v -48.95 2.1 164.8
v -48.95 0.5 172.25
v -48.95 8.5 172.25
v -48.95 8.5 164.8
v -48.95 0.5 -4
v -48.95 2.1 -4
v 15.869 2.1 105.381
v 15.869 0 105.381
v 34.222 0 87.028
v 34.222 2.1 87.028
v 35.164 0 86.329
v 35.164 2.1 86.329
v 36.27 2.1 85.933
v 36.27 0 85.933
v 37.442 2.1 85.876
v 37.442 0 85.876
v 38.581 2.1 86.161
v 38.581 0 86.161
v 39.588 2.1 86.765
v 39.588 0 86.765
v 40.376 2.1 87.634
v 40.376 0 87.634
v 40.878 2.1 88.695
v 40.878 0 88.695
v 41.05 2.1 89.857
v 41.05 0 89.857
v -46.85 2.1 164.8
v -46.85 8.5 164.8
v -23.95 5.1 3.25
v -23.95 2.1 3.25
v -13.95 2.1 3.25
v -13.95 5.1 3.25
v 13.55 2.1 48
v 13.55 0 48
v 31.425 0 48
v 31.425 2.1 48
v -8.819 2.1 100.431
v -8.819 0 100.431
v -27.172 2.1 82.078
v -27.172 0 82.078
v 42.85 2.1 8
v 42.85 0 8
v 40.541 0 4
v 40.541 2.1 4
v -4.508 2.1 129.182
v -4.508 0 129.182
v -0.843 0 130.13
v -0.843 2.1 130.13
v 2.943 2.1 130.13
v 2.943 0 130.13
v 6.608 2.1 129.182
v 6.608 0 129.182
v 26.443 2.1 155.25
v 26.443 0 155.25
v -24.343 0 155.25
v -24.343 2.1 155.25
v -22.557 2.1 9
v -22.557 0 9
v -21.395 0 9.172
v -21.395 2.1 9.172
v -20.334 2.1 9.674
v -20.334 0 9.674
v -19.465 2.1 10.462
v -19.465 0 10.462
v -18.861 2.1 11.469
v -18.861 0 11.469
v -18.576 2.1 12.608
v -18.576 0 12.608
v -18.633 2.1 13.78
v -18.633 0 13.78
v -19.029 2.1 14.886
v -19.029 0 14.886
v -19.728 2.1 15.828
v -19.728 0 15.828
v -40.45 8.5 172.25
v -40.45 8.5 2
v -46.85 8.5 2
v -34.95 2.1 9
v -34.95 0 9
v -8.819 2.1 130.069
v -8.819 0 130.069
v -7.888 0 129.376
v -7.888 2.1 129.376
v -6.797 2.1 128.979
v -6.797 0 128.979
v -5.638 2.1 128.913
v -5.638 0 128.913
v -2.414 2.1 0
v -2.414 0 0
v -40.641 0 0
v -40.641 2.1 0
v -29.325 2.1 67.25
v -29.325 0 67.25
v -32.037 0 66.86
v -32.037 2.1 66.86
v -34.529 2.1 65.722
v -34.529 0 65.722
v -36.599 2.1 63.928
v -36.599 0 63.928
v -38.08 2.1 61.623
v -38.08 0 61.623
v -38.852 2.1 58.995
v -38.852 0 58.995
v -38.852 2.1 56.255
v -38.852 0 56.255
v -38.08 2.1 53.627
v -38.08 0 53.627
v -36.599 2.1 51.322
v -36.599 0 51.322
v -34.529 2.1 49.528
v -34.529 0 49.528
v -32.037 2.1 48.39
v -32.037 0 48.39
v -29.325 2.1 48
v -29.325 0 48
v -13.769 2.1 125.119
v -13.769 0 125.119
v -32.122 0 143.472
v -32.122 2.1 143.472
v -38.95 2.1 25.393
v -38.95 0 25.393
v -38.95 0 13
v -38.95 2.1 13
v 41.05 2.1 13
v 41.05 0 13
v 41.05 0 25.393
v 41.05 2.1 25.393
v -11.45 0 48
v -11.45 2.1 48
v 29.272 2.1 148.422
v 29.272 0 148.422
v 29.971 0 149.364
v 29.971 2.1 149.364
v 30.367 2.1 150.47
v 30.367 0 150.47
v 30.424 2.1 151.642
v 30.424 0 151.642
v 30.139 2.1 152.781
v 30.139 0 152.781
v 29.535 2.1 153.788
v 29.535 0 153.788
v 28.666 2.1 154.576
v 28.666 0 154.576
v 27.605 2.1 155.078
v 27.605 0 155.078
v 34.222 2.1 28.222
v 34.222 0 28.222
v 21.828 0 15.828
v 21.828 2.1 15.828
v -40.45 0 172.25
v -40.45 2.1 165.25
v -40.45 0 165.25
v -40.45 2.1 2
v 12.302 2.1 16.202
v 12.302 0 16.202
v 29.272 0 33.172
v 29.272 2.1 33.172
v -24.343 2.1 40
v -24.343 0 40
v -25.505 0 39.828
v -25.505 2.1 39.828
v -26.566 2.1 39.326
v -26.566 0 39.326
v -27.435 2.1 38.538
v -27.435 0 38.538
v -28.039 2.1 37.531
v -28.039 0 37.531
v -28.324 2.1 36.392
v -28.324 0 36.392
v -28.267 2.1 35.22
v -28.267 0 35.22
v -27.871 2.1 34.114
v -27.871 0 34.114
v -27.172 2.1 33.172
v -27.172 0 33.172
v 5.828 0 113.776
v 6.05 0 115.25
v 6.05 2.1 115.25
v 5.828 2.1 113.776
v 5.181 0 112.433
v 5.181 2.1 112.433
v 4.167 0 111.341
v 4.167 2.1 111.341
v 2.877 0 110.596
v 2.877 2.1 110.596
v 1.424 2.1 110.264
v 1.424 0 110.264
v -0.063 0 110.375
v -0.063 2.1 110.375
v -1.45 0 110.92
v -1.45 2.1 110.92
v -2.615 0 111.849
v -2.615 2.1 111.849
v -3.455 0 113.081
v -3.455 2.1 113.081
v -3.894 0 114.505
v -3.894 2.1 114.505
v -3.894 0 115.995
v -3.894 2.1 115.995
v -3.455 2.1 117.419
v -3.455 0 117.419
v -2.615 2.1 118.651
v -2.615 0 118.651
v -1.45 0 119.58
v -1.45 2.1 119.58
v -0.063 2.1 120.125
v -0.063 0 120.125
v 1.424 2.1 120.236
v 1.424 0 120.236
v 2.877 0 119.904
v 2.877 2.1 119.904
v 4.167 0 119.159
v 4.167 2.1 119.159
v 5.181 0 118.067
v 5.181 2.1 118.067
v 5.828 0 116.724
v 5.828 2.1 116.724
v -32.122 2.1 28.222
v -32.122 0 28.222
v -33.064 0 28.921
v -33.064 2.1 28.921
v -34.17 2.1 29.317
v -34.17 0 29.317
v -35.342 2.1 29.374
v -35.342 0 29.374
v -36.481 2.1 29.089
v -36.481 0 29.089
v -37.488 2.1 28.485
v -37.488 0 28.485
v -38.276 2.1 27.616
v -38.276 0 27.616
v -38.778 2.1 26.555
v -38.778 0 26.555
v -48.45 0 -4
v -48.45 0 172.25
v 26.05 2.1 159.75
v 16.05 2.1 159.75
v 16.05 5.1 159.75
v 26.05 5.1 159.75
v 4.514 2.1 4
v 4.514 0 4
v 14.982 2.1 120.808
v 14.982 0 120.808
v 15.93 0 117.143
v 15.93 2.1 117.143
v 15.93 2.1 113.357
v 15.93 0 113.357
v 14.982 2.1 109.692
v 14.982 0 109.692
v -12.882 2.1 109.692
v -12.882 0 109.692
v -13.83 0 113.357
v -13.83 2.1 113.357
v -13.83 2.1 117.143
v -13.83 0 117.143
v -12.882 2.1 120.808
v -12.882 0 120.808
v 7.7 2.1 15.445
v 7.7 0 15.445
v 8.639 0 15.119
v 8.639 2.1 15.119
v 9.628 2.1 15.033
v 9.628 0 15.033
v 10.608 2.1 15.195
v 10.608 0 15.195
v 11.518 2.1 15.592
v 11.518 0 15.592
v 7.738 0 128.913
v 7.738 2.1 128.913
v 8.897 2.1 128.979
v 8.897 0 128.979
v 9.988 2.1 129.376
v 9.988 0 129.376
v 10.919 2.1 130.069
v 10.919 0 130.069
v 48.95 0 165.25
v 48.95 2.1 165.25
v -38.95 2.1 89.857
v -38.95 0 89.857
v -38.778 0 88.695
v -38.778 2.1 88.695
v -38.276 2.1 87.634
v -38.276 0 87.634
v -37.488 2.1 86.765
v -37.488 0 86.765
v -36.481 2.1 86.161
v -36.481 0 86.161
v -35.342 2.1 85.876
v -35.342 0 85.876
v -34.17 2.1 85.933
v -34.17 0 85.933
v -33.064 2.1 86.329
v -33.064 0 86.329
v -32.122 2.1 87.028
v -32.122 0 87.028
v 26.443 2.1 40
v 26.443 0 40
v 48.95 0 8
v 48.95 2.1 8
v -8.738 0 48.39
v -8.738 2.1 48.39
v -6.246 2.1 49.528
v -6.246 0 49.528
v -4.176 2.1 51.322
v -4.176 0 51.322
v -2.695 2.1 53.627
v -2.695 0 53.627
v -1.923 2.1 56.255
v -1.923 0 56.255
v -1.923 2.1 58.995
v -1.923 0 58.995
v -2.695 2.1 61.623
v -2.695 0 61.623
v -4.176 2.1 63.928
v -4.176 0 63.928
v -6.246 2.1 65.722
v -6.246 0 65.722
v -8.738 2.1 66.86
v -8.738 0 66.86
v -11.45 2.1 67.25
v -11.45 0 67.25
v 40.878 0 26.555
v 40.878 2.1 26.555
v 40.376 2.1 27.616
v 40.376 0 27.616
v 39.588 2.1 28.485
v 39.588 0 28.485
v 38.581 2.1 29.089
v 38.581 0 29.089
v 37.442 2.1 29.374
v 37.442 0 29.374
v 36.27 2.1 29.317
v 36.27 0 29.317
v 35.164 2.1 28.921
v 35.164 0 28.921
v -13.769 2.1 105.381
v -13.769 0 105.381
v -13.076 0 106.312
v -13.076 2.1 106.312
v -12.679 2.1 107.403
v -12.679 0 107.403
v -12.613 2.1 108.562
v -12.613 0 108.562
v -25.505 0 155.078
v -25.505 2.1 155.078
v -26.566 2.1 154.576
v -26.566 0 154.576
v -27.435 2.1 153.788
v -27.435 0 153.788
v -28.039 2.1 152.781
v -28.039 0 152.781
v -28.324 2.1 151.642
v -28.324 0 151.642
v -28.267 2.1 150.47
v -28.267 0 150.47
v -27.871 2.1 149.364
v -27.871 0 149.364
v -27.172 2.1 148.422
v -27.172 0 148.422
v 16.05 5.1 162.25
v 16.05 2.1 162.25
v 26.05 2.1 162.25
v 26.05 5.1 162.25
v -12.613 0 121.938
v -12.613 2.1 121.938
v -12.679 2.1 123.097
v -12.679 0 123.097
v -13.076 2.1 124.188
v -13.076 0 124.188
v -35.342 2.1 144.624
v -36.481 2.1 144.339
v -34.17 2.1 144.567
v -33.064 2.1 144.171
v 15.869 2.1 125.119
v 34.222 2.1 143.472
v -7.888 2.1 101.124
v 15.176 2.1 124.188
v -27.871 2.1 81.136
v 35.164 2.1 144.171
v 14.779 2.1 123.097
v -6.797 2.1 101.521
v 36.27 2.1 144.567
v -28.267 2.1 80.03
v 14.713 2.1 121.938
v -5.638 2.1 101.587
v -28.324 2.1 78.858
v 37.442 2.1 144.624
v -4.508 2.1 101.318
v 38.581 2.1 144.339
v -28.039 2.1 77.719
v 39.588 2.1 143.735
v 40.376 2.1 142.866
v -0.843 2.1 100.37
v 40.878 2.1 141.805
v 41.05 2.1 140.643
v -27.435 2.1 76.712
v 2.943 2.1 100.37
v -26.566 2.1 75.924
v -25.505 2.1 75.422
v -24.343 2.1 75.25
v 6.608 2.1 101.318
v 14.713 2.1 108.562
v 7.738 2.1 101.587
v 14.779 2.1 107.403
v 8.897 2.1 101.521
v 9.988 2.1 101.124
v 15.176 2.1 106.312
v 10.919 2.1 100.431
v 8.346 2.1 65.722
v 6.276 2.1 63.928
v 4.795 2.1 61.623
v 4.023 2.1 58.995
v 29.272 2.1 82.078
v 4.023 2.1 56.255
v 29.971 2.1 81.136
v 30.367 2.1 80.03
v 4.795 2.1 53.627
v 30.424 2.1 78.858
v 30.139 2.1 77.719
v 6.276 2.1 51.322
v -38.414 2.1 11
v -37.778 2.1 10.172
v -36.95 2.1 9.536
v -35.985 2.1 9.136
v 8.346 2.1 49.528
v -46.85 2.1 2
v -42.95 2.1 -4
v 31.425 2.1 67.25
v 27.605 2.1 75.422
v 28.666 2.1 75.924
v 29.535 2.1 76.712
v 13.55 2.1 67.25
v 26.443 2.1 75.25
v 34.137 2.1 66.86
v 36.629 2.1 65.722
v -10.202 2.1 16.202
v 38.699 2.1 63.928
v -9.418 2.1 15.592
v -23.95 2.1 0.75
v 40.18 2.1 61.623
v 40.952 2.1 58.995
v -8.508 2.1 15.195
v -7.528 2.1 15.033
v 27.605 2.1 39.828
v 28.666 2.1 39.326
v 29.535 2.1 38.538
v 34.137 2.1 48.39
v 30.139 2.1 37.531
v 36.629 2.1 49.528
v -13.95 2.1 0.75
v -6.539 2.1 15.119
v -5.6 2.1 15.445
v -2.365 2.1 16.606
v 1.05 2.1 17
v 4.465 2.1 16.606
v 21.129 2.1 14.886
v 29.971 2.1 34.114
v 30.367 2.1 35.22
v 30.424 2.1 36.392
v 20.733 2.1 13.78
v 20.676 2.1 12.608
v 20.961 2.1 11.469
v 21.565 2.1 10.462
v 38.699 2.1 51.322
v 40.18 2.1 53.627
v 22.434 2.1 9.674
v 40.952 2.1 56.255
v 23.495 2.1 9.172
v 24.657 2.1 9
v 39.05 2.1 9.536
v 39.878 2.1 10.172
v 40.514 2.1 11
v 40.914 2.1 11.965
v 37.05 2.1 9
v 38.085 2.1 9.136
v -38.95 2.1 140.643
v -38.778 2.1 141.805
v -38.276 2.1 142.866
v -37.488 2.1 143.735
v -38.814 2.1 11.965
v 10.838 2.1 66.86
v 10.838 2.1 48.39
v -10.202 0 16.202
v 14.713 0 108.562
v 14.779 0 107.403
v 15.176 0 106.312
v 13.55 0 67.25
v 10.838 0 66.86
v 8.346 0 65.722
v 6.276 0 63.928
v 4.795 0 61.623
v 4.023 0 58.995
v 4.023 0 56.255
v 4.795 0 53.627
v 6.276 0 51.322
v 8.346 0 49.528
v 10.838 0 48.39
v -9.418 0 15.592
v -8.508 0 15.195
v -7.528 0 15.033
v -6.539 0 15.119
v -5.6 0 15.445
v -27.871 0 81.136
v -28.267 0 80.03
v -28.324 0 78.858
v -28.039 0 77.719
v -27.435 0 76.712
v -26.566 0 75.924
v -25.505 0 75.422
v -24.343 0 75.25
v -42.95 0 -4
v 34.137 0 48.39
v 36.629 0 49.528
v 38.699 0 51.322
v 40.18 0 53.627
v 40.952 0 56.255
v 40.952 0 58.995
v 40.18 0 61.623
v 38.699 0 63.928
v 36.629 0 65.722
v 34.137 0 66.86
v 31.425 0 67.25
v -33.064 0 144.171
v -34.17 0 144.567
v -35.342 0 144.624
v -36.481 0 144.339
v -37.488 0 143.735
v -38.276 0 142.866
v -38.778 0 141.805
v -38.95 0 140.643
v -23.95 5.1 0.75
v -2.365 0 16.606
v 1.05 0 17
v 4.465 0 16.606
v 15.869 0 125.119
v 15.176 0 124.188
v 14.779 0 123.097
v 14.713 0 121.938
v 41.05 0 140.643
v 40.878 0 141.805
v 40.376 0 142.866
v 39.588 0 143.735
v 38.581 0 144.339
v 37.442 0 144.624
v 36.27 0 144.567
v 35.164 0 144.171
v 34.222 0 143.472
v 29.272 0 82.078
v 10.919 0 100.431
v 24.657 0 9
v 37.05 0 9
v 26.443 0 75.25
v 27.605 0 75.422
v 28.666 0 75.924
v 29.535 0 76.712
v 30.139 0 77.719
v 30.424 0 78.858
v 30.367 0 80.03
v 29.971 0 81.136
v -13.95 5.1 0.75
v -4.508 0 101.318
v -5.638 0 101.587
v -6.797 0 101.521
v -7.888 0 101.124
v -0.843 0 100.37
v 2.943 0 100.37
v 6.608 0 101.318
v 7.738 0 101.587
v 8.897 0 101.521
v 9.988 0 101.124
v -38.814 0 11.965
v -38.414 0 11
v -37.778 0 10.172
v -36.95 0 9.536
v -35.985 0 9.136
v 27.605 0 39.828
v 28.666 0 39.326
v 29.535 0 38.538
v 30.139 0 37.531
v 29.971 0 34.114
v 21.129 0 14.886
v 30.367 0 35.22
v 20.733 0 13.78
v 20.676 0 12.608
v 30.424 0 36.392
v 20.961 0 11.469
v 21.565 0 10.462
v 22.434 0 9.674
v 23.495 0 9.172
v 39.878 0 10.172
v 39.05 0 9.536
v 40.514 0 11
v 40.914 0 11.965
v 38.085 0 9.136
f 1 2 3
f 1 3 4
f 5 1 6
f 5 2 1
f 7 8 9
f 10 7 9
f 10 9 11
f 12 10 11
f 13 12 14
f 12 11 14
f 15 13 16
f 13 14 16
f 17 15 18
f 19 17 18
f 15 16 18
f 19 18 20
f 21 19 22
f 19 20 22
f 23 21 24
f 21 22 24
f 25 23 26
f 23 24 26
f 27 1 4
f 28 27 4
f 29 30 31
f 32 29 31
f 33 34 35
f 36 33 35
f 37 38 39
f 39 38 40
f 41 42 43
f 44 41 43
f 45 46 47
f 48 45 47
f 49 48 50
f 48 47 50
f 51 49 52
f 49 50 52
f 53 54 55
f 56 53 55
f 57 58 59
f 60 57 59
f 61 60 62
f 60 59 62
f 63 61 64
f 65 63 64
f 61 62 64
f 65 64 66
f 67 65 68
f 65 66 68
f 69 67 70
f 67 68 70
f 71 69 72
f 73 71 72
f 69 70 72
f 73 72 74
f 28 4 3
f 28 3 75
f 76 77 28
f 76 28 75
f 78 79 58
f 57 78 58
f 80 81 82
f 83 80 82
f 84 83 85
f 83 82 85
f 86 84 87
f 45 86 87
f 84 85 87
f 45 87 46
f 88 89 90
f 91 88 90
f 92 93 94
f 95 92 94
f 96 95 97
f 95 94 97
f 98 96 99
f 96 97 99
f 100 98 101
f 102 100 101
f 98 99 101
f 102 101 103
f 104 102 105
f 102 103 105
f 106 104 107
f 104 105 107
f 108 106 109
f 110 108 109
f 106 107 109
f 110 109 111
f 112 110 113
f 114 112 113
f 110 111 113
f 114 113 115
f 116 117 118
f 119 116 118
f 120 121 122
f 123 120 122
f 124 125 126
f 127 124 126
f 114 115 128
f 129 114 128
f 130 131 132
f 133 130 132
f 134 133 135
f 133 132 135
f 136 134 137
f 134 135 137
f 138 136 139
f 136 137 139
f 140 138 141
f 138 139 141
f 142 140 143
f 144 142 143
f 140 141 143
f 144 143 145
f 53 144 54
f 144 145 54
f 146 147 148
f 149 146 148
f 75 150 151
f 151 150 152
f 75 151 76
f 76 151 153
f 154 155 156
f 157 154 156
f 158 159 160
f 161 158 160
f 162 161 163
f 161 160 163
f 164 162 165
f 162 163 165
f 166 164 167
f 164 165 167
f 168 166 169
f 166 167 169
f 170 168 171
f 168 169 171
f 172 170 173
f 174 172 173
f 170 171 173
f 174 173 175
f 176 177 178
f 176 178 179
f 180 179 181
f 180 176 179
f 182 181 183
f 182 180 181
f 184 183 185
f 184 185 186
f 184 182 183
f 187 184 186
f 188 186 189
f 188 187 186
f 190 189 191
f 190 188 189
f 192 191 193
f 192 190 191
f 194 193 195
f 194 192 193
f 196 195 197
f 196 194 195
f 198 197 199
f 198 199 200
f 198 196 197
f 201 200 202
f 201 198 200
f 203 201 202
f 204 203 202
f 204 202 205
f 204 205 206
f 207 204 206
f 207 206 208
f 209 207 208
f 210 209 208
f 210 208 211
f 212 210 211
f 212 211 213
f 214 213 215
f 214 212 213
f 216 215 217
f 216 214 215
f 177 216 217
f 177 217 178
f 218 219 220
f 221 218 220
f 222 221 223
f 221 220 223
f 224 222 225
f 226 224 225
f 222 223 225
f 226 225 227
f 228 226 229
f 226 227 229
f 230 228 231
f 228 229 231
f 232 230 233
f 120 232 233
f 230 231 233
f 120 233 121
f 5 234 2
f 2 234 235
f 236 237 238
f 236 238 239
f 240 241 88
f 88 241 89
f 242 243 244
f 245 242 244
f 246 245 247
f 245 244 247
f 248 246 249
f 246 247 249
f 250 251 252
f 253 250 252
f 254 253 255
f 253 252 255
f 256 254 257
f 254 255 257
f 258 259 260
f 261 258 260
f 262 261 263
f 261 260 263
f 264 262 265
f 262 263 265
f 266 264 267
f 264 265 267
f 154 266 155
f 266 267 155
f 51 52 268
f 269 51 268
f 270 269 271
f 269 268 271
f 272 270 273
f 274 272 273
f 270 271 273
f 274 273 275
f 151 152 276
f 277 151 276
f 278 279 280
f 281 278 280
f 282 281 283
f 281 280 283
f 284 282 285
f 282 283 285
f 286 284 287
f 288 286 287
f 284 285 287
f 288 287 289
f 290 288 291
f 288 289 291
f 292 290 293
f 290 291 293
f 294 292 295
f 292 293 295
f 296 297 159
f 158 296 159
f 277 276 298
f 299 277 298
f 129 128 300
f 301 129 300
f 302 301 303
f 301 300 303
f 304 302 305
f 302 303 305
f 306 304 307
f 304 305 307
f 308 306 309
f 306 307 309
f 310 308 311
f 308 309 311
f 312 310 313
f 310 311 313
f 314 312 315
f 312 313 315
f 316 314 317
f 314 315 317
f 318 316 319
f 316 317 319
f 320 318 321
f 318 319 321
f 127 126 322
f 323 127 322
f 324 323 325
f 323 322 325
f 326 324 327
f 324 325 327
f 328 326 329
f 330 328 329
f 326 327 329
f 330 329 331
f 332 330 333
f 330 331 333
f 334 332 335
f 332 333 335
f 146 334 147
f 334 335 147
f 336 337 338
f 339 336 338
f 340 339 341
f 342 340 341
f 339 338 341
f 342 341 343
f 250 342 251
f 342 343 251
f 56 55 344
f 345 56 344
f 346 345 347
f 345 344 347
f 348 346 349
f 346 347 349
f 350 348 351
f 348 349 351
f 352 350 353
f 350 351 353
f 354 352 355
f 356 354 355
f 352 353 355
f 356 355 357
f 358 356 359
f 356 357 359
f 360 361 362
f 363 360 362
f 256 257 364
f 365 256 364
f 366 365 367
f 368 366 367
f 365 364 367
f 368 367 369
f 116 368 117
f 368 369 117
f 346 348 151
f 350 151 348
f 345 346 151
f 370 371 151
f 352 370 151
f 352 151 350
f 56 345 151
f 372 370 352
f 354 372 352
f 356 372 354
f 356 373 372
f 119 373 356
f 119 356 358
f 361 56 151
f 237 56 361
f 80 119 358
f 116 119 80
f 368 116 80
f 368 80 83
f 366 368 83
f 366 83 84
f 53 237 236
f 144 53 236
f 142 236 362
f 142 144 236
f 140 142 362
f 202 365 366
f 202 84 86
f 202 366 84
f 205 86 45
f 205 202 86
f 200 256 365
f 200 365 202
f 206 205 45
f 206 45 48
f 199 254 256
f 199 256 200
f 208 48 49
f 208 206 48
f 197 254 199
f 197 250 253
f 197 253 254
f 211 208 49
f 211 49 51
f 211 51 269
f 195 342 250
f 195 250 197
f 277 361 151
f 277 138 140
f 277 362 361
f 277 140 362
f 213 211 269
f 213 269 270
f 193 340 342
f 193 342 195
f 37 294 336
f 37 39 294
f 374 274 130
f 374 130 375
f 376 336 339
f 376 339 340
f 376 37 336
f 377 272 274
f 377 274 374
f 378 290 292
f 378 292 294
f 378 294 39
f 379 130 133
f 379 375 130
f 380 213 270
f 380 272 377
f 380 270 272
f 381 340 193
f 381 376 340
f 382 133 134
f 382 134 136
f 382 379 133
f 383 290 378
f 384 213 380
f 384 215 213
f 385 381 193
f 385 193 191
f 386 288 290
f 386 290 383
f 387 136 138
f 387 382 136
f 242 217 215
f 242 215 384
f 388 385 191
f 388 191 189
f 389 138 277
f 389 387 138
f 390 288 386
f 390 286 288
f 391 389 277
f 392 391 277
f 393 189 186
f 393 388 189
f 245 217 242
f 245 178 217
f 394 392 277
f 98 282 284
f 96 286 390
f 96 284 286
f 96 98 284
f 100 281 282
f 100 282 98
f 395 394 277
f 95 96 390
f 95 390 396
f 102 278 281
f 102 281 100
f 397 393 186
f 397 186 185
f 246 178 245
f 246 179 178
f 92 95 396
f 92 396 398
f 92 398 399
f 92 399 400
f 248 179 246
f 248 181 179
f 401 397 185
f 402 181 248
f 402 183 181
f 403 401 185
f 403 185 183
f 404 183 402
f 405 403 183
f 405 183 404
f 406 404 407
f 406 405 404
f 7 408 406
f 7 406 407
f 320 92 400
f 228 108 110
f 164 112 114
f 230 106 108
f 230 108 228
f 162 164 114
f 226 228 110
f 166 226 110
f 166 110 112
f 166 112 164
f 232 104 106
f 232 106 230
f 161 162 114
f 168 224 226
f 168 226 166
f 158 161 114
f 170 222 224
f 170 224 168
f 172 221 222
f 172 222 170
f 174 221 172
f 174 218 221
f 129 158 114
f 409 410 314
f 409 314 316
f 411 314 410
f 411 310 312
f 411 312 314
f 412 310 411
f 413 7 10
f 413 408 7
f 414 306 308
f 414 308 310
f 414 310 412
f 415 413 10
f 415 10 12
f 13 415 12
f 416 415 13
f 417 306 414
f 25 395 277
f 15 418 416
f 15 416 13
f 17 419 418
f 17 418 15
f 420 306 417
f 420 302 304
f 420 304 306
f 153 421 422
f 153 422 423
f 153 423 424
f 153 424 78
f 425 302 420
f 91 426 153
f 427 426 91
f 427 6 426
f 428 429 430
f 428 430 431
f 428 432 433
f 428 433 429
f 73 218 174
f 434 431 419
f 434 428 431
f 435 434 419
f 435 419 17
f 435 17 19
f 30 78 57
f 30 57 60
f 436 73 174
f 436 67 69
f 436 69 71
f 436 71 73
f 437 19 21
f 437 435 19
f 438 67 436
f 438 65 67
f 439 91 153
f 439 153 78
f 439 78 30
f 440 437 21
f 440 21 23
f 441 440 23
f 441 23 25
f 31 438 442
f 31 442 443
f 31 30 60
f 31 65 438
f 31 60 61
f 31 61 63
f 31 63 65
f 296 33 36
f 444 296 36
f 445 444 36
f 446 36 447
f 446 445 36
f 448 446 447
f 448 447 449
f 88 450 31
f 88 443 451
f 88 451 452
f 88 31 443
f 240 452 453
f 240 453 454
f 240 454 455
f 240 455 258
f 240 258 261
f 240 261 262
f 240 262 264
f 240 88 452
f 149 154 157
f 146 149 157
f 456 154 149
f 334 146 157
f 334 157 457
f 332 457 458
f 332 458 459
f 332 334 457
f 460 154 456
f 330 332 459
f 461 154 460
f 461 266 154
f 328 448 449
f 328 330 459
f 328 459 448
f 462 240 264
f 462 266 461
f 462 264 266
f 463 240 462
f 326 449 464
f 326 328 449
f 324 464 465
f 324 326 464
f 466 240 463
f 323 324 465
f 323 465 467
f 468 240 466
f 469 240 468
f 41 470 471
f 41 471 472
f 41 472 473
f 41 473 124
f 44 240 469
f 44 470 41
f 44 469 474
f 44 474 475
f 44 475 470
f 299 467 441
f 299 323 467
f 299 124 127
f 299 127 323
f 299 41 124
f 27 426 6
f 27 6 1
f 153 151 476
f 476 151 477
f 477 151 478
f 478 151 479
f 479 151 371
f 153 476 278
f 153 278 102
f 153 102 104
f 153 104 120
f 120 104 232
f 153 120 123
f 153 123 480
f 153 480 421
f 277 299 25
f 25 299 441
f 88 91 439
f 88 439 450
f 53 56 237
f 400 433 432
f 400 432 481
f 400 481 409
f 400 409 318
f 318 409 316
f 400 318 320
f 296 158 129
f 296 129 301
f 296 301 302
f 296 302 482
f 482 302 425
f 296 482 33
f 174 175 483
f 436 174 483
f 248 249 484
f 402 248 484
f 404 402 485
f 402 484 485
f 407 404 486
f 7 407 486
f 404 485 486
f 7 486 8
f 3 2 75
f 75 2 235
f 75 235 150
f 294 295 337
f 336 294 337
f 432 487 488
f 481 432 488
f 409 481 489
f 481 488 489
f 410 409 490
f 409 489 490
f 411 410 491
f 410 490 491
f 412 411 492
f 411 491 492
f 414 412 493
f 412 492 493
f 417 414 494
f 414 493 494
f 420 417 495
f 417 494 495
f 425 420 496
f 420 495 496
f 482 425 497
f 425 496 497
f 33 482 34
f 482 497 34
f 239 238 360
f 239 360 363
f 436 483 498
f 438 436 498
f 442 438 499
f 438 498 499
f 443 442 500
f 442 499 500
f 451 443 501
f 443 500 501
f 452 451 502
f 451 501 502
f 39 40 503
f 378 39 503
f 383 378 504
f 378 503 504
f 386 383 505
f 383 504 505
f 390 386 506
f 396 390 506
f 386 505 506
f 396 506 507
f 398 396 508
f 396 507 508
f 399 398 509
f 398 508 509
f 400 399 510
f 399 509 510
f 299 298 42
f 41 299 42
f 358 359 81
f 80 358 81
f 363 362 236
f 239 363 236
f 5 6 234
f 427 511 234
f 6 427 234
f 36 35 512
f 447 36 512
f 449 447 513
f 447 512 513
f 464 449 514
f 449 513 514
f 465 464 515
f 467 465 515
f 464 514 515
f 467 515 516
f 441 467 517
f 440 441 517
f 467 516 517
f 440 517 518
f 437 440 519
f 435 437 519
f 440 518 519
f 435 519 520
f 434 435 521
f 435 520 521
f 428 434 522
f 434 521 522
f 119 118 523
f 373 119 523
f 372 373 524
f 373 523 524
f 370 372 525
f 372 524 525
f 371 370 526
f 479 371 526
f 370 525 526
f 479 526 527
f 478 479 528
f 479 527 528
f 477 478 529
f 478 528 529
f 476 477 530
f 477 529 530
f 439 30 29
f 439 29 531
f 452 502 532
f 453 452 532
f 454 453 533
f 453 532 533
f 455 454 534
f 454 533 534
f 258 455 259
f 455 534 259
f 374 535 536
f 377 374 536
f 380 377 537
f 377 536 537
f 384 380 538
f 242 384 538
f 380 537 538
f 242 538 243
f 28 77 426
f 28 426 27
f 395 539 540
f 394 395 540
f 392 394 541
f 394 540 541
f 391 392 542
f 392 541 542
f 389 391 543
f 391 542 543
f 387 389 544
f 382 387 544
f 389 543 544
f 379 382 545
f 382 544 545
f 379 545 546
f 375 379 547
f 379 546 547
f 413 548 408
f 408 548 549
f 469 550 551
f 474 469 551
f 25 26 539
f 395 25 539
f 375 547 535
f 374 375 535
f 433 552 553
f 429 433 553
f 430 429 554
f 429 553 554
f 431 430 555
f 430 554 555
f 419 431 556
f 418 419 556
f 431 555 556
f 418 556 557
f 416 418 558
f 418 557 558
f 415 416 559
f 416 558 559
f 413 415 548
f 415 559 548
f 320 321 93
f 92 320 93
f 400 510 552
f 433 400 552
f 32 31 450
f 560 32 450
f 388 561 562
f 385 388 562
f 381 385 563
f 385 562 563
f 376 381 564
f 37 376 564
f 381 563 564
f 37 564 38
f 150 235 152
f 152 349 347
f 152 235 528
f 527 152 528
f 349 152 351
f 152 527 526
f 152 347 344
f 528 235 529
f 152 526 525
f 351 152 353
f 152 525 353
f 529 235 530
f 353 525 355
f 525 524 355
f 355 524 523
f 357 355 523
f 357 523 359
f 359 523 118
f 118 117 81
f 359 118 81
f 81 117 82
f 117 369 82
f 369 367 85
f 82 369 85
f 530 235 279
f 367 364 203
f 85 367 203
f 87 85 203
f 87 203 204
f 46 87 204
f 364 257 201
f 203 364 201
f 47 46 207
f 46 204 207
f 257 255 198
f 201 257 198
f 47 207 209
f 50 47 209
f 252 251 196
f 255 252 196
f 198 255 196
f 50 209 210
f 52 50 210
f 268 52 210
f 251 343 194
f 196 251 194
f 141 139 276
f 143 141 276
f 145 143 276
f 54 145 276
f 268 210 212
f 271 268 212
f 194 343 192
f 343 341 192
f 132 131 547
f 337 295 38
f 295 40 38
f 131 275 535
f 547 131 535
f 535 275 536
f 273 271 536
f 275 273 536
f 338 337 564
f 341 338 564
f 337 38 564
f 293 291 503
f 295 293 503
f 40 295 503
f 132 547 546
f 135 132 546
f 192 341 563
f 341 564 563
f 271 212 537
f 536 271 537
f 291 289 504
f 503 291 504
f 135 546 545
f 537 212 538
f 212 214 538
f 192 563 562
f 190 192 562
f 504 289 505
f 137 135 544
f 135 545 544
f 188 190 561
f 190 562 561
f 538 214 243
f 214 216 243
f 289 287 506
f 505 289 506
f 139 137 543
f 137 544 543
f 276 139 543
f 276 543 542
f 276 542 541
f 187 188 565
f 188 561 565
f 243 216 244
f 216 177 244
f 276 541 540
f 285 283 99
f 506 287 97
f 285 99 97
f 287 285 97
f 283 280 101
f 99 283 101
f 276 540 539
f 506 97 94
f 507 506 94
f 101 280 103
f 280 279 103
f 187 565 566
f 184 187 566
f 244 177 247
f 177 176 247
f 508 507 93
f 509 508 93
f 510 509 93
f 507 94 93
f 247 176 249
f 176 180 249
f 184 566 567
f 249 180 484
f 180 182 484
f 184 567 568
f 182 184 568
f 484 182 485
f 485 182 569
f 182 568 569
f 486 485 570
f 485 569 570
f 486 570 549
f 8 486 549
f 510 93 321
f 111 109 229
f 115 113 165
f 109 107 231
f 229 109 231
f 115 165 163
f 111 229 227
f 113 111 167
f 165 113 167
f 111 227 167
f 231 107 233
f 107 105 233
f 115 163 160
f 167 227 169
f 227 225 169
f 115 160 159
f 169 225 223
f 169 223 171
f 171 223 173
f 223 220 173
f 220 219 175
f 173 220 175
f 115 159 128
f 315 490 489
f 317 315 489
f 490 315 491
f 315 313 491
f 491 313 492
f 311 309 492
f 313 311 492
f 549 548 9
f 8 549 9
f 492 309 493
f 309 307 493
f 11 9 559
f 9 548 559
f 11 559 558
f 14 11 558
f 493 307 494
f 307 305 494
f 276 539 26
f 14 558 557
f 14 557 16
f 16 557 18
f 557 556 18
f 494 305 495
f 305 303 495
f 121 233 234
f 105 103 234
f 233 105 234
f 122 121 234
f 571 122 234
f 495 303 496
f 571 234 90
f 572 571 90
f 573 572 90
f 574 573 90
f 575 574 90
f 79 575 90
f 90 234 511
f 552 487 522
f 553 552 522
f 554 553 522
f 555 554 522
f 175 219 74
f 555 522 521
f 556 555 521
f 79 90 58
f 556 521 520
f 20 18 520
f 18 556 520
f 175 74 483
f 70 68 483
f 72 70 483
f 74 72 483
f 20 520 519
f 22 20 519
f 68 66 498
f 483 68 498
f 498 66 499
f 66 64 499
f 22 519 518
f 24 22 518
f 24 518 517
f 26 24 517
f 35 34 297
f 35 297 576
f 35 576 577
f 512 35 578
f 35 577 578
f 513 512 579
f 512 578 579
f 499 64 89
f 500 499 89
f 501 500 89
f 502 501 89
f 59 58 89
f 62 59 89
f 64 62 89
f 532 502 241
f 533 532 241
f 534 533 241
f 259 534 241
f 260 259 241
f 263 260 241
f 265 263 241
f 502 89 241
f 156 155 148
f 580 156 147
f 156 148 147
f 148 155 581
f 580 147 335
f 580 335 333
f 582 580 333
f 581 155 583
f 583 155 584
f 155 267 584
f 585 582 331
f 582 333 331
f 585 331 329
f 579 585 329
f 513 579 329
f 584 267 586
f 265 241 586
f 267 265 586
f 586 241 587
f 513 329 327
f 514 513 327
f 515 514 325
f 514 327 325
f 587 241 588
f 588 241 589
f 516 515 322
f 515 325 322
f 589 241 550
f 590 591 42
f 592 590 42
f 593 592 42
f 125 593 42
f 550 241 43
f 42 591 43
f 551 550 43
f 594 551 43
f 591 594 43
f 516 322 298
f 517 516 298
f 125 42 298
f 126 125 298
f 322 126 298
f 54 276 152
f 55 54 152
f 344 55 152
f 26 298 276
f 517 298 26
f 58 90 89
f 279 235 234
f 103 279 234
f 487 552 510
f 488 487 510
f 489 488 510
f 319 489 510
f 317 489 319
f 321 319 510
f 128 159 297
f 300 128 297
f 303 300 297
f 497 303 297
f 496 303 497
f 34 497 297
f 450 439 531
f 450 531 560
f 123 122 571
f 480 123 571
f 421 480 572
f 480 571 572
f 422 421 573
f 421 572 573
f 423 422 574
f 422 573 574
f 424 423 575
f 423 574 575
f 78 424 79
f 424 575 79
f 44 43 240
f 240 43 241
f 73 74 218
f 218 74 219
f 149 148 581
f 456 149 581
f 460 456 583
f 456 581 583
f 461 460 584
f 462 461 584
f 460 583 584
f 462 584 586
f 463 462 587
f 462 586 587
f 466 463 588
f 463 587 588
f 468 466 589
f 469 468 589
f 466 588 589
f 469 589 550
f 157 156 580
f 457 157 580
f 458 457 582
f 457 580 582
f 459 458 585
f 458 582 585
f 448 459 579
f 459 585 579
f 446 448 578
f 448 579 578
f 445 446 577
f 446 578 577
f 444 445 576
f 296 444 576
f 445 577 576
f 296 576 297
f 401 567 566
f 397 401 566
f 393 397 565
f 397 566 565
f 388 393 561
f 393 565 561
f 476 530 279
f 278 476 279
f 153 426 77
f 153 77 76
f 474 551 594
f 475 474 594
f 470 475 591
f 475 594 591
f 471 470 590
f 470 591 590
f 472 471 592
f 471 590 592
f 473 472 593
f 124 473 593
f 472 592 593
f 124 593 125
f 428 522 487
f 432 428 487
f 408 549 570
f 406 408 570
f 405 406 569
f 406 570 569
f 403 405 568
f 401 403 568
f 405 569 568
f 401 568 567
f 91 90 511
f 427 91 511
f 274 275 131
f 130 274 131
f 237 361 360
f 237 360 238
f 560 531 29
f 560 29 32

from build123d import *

# Parameters (mm, degrees)
SKETCH1_R           = 5
BOSS_EXTRUDE1_DEPTH = 2.1
SKETCH2_W           = 8.5
SKETCH2_H           = 170.25
BOSS_EXTRUDE2_DEPTH = 6.4
SKETCH3_W           = 162.8
SKETCH3_H           = 6.4
CUT_EXTRUDE1_DEPTH  = 2.1
SKETCH4_W           = 10
SKETCH4_H           = 2.5
BOSS_EXTRUDE3_DEPTH = 3
CHAMFER1_SIZE       = 0.5


with BuildPart() as part:
    # Sketch1 → Boss-Extrude1 (new body)
    with BuildSketch(Plane(origin=(0, 0, 0), x_dir=(1, 0, 0), z_dir=(0, 1, 0))):
        Polygon((-48.95, 0.55), (-48.95, -172.25), (-40.45, -172.25), (-40.45, -165.25), (48.95, -165.25), (48.95, -8), (42.85, -8), (40.540598923, -4), (4.514101615, -4), (-2.414101615, 0), (-40.640598923, 0), (-42.95, 4), (-48.95, 4), align=None)
        with BuildLine():
            Line((-13.76890063, -125.119153161), (-32.121572875, -143.471825407))
            ThreePointArc((-32.121572875, -143.471825407), (-36.480733729, -144.338916412), (-38.95, -140.643398282))
            Line((-38.95, -140.643398282), (-38.95, -89.856601718))
            ThreePointArc((-38.95, -89.856601718), (-36.480733729, -86.161083588), (-32.121572875, -87.028174593))
            Line((-32.121572875, -87.028174593), (-13.76890063, -105.380846839))
            ThreePointArc((-13.76890063, -105.380846839), (-12.679375, -107.403267629), (-12.882100859, -109.691532076))
            ThreePointArc((-12.882100859, -109.691532076), (-13.95, -115.25), (-12.882100859, -120.808467924))
            ThreePointArc((-12.882100859, -120.808467924), (-12.679375, -123.096732371), (-13.76890063, -125.119153161))
        make_face(mode=Mode.SUBTRACT)
        with BuildLine():
            ThreePointArc((-24.343398282, -155.25), (-28.038916412, -152.780733729), (-27.171825407, -148.421572875))
            Line((-27.171825407, -148.421572875), (-8.819153161, -130.06890063))
            ThreePointArc((-8.819153161, -130.06890063), (-6.796732371, -128.979375), (-4.508467924, -129.182100859))
            ThreePointArc((-4.508467924, -129.182100859), (1.05, -130.25), (6.608467924, -129.182100859))
            ThreePointArc((6.608467924, -129.182100859), (8.896732371, -128.979375), (10.919153161, -130.06890063))
            Line((10.919153161, -130.06890063), (29.271825407, -148.421572875))
            ThreePointArc((29.271825407, -148.421572875), (30.138916412, -152.780733729), (26.443398282, -155.25))
            Line((26.443398282, -155.25), (-24.343398282, -155.25))
        make_face(mode=Mode.SUBTRACT)
        with Locations((1.05, -115.25)):
            Circle(SKETCH1_R, mode=Mode.SUBTRACT)
        with BuildLine():
            Line((29.271825407, -82.078427125), (10.919153161, -100.43109937))
            ThreePointArc((10.919153161, -100.43109937), (8.896732371, -101.520625), (6.608467924, -101.317899141))
            ThreePointArc((6.608467924, -101.317899141), (1.05, -100.25), (-4.508467924, -101.317899141))
            ThreePointArc((-4.508467924, -101.317899141), (-6.796732371, -101.520625), (-8.819153161, -100.43109937))
            Line((-8.819153161, -100.43109937), (-27.171825407, -82.078427125))
            ThreePointArc((-27.171825407, -82.078427125), (-28.038916412, -77.719266271), (-24.343398282, -75.25))
            Line((-24.343398282, -75.25), (26.443398282, -75.25))
            ThreePointArc((26.443398282, -75.25), (30.138916412, -77.719266271), (29.271825407, -82.078427125))
        make_face(mode=Mode.SUBTRACT)
        with BuildLine():
            ThreePointArc((41.05, -140.643398282), (38.580733729, -144.338916412), (34.221572875, -143.471825407))
            Line((34.221572875, -143.471825407), (15.86890063, -125.119153161))
            ThreePointArc((15.86890063, -125.119153161), (14.779375, -123.096732371), (14.982100859, -120.808467924))
            ThreePointArc((14.982100859, -120.808467924), (16.05, -115.25), (14.982100859, -109.691532076))
            ThreePointArc((14.982100859, -109.691532076), (14.779375, -107.403267629), (15.86890063, -105.380846839))
            Line((15.86890063, -105.380846839), (34.221572875, -87.028174593))
            ThreePointArc((34.221572875, -87.028174593), (38.580733729, -86.161083588), (41.05, -89.856601718))
            Line((41.05, -89.856601718), (41.05, -140.643398282))
        make_face(mode=Mode.SUBTRACT)
        with BuildLine():
            ThreePointArc((-29.325, -67.25), (-38.95, -57.625), (-29.325, -48))
            Line((-29.325, -48), (-11.45, -48))
            ThreePointArc((-11.45, -48), (-1.825, -57.625), (-11.45, -67.25))
            Line((-11.45, -67.25), (-29.325, -67.25))
        make_face(mode=Mode.SUBTRACT)
        with BuildLine():
            ThreePointArc((-38.95, -13), (-37.778427125, -10.171572875), (-34.95, -9))
            Line((-34.95, -9), (-22.556601718, -9))
            ThreePointArc((-22.556601718, -9), (-18.861083588, -11.469266271), (-19.728174593, -15.828427125))
            Line((-19.728174593, -15.828427125), (-32.121572875, -28.221825407))
            ThreePointArc((-32.121572875, -28.221825407), (-36.480733729, -29.088916412), (-38.95, -25.393398282))
            Line((-38.95, -25.393398282), (-38.95, -13))
        make_face(mode=Mode.SUBTRACT)
        with BuildLine():
            ThreePointArc((13.55, -67.25), (3.925, -57.625), (13.55, -48))
            Line((13.55, -48), (31.425, -48))
            ThreePointArc((31.425, -48), (41.05, -57.625), (31.425, -67.25))
            Line((31.425, -67.25), (13.55, -67.25))
        make_face(mode=Mode.SUBTRACT)
        with BuildLine():
            ThreePointArc((-24.343398282, -40), (-28.038916412, -37.530733729), (-27.171825407, -33.171572875))
            Line((-27.171825407, -33.171572875), (-10.202325554, -16.202073022))
            ThreePointArc((-10.202325554, -16.202073022), (-8.02311566, -15.083537139), (-5.600446128, -15.445131695))
            ThreePointArc((-5.600446128, -15.445131695), (1.05, -17), (7.700446128, -15.445131695))
            ThreePointArc((7.700446128, -15.445131695), (10.12311566, -15.083537139), (12.302325554, -16.202073022))
            Line((12.302325554, -16.202073022), (29.271825407, -33.171572875))
            ThreePointArc((29.271825407, -33.171572875), (30.138916412, -37.530733729), (26.443398282, -40))
            Line((26.443398282, -40), (-24.343398282, -40))
        make_face(mode=Mode.SUBTRACT)
        with BuildLine():
            ThreePointArc((37.05, -9), (39.878427125, -10.171572875), (41.05, -13))
            Line((41.05, -13), (41.05, -25.393398282))
            ThreePointArc((41.05, -25.393398282), (38.580733729, -29.088916412), (34.221572875, -28.221825407))
            Line((34.221572875, -28.221825407), (21.828174593, -15.828427125))
            ThreePointArc((21.828174593, -15.828427125), (20.961083588, -11.469266271), (24.656601718, -9))
            Line((24.656601718, -9), (37.05, -9))
        make_face(mode=Mode.SUBTRACT)
    extrude(amount=BOSS_EXTRUDE1_DEPTH)

    # Sketch2 → Boss-Extrude2 (add)
    with BuildSketch(Plane(origin=(0, 2.1, 0), x_dir=(1, 0, 0), z_dir=(0, 1, 0))):
        with Locations((-44.7, -87.125)):
            Rectangle(SKETCH2_W, SKETCH2_H)
    extrude(amount=BOSS_EXTRUDE2_DEPTH)

    # Sketch3 → Cut-Extrude1 (cut)
    with BuildSketch(Plane.ZY.offset(48.95)):
        with Locations((83.4, 5.3)):
            Rectangle(SKETCH3_W, SKETCH3_H)
    extrude(amount=-CUT_EXTRUDE1_DEPTH, mode=Mode.SUBTRACT)

    # Sketch4 → Boss-Extrude3 (add)
    with BuildSketch(Plane(origin=(0, 2.1, 0), x_dir=(1, 0, 0), z_dir=(0, 1, 0))):
        with Locations((-18.95, -2)):
            Rectangle(SKETCH4_W, SKETCH4_H)
        with Locations((21.05, -161)):
            Rectangle(SKETCH4_W, SKETCH4_H)
    extrude(amount=BOSS_EXTRUDE3_DEPTH)

    # Chamfer1
    chamfer1_edges = [part.edges().sort_by_distance(p)[0] for p in [
        (-48.95, 0, 84.125),
    ]]
    chamfer(chamfer1_edges, length=CHAMFER1_SIZE)


solid = part.part
